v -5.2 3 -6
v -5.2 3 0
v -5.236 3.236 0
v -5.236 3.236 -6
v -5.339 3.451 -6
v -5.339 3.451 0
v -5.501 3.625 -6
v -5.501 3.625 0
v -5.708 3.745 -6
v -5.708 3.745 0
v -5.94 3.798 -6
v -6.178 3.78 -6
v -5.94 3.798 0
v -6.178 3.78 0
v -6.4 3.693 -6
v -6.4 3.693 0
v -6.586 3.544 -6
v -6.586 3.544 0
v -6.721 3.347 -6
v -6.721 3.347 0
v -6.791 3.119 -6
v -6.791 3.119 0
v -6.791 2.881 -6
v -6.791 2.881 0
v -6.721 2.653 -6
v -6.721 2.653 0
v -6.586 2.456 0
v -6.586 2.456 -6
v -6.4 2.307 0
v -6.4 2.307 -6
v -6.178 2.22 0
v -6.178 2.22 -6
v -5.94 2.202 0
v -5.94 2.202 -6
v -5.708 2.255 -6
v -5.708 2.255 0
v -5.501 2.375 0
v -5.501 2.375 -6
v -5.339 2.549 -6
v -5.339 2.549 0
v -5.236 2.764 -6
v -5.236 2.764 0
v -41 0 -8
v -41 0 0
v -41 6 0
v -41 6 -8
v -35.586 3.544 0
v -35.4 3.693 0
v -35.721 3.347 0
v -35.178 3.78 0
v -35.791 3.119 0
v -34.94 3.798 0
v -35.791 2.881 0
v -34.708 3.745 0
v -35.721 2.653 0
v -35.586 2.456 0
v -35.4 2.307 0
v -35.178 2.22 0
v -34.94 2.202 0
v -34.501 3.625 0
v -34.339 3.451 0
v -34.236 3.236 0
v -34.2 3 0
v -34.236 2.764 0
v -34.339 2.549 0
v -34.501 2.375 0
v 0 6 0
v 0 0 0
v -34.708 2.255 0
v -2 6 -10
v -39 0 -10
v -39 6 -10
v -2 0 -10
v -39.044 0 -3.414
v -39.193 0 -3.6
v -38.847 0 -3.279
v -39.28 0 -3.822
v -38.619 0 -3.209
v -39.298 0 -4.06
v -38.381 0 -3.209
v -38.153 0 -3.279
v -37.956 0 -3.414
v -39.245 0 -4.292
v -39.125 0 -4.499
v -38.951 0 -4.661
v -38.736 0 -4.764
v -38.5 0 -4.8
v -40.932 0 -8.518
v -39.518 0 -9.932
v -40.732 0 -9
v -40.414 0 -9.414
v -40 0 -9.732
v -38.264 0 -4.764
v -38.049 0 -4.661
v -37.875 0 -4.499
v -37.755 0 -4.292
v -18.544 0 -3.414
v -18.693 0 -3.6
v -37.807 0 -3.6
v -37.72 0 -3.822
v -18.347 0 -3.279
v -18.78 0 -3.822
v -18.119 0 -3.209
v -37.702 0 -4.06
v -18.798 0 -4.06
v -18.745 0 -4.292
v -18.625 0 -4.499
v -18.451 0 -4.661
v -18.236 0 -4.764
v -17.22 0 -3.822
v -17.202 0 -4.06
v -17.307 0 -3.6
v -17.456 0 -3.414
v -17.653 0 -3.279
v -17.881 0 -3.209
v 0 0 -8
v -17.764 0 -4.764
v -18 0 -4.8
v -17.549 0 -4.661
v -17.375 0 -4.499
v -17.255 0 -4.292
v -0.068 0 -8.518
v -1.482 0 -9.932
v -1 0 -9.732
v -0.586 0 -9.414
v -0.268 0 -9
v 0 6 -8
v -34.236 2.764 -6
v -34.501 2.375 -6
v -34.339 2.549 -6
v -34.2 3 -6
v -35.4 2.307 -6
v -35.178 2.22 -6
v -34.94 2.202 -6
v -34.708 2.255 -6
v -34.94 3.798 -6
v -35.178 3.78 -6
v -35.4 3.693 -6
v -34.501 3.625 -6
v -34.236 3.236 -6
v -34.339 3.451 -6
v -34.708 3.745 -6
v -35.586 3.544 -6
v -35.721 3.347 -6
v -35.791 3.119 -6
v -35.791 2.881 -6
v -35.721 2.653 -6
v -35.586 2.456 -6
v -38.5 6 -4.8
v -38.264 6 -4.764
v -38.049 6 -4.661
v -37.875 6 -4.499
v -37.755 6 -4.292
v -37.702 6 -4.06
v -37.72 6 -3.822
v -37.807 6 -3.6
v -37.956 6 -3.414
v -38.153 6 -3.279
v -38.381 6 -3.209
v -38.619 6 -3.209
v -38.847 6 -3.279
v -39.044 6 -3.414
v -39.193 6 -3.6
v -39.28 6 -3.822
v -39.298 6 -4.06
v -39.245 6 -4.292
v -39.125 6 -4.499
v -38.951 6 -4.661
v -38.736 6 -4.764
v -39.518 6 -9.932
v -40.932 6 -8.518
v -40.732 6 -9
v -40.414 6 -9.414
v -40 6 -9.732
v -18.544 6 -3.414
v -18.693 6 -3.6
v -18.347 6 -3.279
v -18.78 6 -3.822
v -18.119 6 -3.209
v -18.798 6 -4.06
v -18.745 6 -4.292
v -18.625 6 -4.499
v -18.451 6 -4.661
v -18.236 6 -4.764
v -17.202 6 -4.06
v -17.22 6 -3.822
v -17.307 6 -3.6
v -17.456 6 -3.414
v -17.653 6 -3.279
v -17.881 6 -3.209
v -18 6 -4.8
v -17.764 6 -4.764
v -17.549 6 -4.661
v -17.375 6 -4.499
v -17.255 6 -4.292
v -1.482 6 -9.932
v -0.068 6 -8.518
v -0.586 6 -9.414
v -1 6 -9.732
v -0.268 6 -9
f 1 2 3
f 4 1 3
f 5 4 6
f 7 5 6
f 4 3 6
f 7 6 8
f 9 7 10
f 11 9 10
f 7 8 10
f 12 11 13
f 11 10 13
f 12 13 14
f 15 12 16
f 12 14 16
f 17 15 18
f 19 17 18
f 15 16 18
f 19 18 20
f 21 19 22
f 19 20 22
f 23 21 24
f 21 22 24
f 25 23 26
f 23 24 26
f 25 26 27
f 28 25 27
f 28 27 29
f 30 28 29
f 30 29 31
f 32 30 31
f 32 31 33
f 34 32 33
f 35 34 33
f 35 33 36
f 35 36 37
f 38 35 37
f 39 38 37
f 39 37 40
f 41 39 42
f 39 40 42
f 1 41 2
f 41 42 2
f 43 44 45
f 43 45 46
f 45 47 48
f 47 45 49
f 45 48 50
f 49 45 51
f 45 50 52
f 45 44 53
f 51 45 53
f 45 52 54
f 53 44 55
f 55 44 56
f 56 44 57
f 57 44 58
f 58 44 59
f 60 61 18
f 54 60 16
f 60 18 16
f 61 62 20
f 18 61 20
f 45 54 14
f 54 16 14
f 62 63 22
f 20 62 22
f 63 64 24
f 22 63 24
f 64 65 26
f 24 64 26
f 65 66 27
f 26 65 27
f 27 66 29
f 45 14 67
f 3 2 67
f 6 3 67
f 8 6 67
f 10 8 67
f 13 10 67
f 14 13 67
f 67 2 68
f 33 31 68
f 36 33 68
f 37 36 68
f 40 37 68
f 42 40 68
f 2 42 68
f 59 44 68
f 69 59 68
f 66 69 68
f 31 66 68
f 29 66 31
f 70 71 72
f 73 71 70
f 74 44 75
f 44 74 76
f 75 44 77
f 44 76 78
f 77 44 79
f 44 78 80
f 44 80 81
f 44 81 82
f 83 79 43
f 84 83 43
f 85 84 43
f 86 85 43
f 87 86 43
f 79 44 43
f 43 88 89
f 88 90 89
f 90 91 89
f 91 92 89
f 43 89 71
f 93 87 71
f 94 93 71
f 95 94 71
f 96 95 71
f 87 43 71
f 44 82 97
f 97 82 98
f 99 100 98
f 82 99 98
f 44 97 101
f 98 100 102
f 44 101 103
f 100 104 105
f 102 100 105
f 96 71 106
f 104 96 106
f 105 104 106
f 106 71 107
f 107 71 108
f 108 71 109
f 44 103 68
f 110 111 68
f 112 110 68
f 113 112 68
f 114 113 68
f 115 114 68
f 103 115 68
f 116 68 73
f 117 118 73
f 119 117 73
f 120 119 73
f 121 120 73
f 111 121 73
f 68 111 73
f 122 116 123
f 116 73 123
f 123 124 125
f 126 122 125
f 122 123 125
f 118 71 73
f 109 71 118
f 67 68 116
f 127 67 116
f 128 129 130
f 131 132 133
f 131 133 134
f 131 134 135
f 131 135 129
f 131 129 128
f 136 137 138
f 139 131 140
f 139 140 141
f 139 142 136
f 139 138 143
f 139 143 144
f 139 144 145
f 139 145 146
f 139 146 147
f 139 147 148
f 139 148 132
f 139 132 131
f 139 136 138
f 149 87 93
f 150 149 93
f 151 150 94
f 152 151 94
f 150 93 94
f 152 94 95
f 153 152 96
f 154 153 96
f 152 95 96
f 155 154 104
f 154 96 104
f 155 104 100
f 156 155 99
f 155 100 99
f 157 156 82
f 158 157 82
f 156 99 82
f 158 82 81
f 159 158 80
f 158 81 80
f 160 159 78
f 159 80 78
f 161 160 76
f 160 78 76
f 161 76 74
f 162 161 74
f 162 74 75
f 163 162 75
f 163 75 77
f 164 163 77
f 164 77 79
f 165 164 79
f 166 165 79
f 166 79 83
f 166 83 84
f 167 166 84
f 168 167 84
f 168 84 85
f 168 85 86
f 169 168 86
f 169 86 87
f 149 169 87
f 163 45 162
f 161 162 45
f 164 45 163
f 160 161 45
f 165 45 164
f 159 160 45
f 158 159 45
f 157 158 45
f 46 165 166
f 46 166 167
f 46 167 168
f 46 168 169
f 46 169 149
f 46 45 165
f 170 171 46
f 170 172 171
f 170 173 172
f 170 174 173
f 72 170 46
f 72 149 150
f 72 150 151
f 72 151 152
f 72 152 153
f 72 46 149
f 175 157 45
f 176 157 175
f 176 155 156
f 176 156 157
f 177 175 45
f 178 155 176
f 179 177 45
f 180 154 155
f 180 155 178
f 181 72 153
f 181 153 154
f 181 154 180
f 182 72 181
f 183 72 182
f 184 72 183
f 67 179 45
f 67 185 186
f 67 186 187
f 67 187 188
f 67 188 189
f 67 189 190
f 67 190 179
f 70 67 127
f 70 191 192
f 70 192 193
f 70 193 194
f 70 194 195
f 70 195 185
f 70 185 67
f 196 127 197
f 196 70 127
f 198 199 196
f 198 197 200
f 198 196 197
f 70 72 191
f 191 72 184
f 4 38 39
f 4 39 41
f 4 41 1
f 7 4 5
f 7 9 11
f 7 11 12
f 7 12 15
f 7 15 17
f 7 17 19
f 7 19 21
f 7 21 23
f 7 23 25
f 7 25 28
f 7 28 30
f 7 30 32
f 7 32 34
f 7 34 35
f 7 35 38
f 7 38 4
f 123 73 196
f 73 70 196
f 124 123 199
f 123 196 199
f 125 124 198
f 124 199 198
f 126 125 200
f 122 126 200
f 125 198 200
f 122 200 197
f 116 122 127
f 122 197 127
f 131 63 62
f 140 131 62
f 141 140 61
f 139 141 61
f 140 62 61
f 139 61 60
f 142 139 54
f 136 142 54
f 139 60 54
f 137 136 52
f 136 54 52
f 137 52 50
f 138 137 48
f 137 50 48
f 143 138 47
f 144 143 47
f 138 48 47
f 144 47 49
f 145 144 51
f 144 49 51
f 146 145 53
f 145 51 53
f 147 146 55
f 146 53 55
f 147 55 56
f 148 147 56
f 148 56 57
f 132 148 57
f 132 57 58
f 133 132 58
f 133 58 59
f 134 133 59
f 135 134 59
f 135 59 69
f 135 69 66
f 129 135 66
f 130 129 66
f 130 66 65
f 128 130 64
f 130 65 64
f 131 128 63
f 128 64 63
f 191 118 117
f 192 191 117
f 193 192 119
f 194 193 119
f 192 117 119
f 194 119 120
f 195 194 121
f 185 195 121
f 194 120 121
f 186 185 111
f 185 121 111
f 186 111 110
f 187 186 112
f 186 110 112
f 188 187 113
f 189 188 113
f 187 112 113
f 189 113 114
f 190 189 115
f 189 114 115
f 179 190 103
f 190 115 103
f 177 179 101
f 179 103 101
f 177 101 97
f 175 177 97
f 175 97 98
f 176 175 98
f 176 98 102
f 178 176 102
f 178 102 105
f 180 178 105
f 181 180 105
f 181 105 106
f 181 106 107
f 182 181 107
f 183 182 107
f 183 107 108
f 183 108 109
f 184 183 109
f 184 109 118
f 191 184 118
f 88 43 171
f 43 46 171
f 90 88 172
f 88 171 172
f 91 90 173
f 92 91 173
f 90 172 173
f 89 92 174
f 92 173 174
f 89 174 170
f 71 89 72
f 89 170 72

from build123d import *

# Parameters (mm, degrees)
SKETCH_1_W          = 41
SKETCH_1_H          = 10
EXTRUDE_1_DEPTH     = 6
SKETCH_2_R          = 0.8
CUT_EXTRUDE_1_DEPTH = 6
FILLET_1_R          = 2
SKETCH_6_R          = 0.8
CUT_EXTRUDE_3_DEPTH = 10


with BuildPart() as part:
    # 草图1 → 凸台-拉伸1 (new body)
    with BuildSketch(Plane(origin=(0, 0, 0), x_dir=(1, 0, 0), z_dir=(0, 1, 0))):
        with Locations((-20.5, 5)):
            Rectangle(SKETCH_1_W, SKETCH_1_H)
    extrude(amount=EXTRUDE_1_DEPTH)

    # 草图2 → 切除-拉伸1 (cut)
    with BuildSketch(Plane.XY):
        with Locations((-6, 3)):
            Circle(SKETCH_2_R)
        with Locations((-35, 3)):
            Circle(SKETCH_2_R)
    extrude(amount=-CUT_EXTRUDE_1_DEPTH, mode=Mode.SUBTRACT)

    # 圆角1
    fillet_1_edges = [part.edges().sort_by_distance(p)[0] for p in [
        (-41, 3, -10),
        (0, 3, -10),
    ]]
    fillet(fillet_1_edges, radius=FILLET_1_R)

    # 草图6 → 切除-拉伸3 (cut)
    with BuildSketch(Plane(origin=(0, 0, 0), x_dir=(-1, 0, 0), z_dir=(0, -1, 0))):
        with Locations(Location((38.5, 4, 0), (0, 0, 90))):
            Circle(SKETCH_6_R)
        with Locations(Location((18, 4, 0), (0, 0, 90))):
            Circle(SKETCH_6_R)
    extrude(amount=-CUT_EXTRUDE_3_DEPTH, mode=Mode.SUBTRACT)


solid = part.part
